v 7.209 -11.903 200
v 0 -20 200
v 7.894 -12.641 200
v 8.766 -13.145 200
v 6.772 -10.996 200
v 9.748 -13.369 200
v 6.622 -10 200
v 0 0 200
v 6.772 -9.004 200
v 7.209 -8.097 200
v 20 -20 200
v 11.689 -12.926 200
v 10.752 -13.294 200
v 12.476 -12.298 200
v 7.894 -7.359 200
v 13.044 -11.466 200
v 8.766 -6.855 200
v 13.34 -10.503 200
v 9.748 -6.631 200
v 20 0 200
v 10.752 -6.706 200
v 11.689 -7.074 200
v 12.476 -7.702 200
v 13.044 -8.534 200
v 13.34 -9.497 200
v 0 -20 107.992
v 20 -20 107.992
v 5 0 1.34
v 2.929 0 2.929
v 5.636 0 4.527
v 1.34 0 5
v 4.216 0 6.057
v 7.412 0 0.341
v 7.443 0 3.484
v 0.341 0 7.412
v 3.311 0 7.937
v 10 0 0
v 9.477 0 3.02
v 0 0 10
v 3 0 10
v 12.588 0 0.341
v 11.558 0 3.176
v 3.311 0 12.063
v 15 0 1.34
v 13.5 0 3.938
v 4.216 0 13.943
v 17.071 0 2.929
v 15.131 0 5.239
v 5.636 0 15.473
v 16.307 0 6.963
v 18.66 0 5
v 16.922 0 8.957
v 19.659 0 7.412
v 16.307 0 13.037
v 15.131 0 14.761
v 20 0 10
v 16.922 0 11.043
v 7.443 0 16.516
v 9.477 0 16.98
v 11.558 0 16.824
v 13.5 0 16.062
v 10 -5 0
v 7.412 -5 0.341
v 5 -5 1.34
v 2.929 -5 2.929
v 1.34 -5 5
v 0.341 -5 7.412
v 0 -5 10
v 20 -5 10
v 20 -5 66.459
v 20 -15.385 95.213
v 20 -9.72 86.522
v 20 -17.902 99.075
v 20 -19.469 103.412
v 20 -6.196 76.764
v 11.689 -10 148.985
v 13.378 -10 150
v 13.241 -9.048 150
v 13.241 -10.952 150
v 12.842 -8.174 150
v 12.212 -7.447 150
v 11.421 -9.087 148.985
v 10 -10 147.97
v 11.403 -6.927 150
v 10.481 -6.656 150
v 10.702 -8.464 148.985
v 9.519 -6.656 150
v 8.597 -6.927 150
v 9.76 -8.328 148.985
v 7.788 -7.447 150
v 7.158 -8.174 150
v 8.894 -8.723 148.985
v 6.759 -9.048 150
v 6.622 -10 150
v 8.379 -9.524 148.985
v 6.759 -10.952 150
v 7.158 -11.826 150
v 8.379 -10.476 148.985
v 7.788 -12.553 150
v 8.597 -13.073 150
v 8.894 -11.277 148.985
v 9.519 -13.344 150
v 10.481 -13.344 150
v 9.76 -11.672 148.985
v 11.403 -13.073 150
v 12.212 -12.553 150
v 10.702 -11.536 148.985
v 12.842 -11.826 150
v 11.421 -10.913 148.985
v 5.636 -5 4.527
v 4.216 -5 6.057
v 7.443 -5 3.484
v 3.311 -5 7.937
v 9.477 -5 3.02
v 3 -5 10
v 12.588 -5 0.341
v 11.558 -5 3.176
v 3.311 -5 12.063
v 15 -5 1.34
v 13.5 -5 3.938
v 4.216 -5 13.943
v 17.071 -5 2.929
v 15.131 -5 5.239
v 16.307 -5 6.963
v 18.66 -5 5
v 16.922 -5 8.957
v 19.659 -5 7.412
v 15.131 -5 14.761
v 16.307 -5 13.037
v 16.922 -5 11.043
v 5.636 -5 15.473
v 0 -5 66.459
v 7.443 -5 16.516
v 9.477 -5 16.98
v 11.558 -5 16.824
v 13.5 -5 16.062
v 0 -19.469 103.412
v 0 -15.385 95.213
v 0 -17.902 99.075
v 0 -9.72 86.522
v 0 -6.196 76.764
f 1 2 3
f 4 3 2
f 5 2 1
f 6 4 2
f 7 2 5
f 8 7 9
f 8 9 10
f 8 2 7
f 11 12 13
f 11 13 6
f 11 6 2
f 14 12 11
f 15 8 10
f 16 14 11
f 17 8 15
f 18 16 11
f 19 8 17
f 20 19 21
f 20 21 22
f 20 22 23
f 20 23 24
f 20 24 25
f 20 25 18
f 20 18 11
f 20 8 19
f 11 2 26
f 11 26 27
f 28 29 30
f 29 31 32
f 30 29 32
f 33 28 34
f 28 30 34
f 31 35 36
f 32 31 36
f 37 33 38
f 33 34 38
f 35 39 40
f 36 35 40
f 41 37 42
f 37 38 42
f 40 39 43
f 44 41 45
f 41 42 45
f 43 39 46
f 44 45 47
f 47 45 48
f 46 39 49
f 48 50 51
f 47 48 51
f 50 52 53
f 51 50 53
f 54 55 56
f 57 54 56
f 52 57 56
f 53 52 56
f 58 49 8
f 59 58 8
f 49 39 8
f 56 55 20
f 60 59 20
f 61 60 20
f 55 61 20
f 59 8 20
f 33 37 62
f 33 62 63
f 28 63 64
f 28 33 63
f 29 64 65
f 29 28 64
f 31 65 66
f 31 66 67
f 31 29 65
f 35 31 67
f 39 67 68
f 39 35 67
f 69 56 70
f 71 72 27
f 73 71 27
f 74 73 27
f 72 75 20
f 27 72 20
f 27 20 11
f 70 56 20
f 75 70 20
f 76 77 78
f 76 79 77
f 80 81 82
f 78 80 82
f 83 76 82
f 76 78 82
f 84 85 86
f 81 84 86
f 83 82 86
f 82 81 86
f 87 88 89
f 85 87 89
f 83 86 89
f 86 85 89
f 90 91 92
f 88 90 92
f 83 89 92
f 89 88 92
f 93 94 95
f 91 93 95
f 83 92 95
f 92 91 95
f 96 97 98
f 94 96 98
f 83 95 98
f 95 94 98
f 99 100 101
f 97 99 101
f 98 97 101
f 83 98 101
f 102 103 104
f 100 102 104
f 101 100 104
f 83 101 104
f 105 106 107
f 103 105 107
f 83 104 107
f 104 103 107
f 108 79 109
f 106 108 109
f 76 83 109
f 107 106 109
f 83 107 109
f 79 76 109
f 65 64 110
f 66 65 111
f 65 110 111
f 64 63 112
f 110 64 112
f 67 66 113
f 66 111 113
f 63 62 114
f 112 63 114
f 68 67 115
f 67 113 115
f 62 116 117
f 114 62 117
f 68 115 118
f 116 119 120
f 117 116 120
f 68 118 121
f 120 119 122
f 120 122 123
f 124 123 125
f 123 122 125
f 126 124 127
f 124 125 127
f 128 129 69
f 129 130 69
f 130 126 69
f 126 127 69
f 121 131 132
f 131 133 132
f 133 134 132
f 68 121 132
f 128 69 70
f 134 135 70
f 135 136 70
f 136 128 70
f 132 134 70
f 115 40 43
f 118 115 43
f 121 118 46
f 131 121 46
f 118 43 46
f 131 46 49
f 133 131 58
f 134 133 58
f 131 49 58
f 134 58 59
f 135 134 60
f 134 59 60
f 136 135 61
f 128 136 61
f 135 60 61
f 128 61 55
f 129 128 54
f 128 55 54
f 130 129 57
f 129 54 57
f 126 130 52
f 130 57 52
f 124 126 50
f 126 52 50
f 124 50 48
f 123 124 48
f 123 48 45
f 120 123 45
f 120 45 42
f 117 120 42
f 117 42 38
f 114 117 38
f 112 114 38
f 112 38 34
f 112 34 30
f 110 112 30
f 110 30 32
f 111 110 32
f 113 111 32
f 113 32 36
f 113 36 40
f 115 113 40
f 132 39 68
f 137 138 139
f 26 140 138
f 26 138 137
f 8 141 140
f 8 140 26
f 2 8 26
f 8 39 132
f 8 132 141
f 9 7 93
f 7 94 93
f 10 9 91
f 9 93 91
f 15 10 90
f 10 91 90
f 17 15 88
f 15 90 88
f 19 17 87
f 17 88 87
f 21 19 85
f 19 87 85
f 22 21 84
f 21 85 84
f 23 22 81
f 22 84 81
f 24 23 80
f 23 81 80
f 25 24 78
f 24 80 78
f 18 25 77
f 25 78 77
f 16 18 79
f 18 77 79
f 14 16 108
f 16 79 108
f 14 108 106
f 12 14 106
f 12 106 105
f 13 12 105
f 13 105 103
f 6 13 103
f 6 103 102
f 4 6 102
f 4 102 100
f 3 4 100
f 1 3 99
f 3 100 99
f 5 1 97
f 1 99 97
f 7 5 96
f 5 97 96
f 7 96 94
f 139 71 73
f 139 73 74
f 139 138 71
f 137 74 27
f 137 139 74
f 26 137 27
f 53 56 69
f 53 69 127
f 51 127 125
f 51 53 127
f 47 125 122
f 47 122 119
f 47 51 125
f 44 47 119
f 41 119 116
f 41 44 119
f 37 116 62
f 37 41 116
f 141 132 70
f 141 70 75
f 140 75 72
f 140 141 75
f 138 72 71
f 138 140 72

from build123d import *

# Parameters (mm, degrees)
F0_W        = 20
F0_H        = 200
F1_DEPTH    = 20
F2_W        = 15
F2_H        = 100
F3_DEPTH    = 20
F6_R        = 7
F7_DEPTH    = 20.001
F8_T1_DEPTH = 20
F9_R        = 20
F11_D       = 6.7564
F11_DEPTH   = 50
F11_TIP     = 2.0298273432


# Not quite as in the source:
# - a fillet or chamfer that OpenCascade refuses, or shapes differently, is made with other operations: its cross-section is extruded or revolved along the edge and cut away or added


with BuildPart() as f1:
    # F0 (on Front) → F1 (new body)
    with BuildSketch(Plane.XZ):
        with Locations((10, 100)):
            Rectangle(F0_W, F0_H)
    extrude(amount=F1_DEPTH)

    # F2 (on face) → F3 (cut)
    with BuildSketch(Plane.YZ.offset(20)):
        with Locations((-12.5, 50)):
            Rectangle(F2_W, F2_H)
    extrude(amount=-F3_DEPTH, mode=Mode.SUBTRACT)

    # F5: sweep along a path in F5_path
    with BuildLine(Plane(origin=(0, -5, 0), x_dir=(0, -1, 0), z_dir=(0, 0, -1))) as f5_path:
        Line((0, 0), (-5, 0))
    # F4 (on face) → F5 (sweep, cut)
    with BuildSketch(Plane(origin=(0, 0, 0), x_dir=(-1, 0, 0), z_dir=(0, 1, 0))):
        with BuildLine():
            Line((0, 0), (0, 10))
            ThreePointArc((0, 10), (-2.9289321881, 2.9289321881), (-10, 0))
            Line((-10, 0), (0, 0))
        make_face()
        with BuildLine():
            ThreePointArc((-10, 0), (-17.0710678277, 2.9289322039), (-20, 10.0000000447))
            Line((-20, 10.0000000447), (-20, 0))
            Line((-20, 0), (-10, 0))
        make_face()
    sweep(path=f5_path.line, mode=Mode.SUBTRACT)

    # F6 (on face) → F7 (cut, through all)
    with BuildSketch(Plane(origin=(0, 0, 0), x_dir=(-1, 0, 0), z_dir=(0, 1, 0))):
        with Locations((-10, 10)):
            Circle(F6_R)
    extrude(amount=-F7_DEPTH, mode=Mode.SUBTRACT)

    # F8: fillet of radius 45 on 1 edges, made by hand

    # F8_s2 → F8_t1 (join)
    with BuildSketch(Plane.YZ):
        with BuildLine():
            ThreePointArc((-5, 66.4589803375), (-8.9208081871, 84.8301534084), (-20, 100))
            Line((-20, 100), (-5, 100))
            Line((-5, 100), (-5, 66.4589803375))
        make_face()
    extrude(amount=F8_T1_DEPTH)

    # F9
    f9_edges = [f1.edges().sort_by_distance(p)[0] for p in [
        (10, -20, 100),
    ]]
    fillet(f9_edges, radius=F9_R)

    # F11
    with Locations(Plane.XY.offset(200)):
        with Locations((10, -10)):
            Hole(F11_D / 2, depth=F11_DEPTH)
            with Locations((0, 0, -(F11_DEPTH + F11_TIP / 2))):  # 118° drill point
                Cone(0, F11_D / 2, F11_TIP, mode=Mode.SUBTRACT)


solid = f1.part
